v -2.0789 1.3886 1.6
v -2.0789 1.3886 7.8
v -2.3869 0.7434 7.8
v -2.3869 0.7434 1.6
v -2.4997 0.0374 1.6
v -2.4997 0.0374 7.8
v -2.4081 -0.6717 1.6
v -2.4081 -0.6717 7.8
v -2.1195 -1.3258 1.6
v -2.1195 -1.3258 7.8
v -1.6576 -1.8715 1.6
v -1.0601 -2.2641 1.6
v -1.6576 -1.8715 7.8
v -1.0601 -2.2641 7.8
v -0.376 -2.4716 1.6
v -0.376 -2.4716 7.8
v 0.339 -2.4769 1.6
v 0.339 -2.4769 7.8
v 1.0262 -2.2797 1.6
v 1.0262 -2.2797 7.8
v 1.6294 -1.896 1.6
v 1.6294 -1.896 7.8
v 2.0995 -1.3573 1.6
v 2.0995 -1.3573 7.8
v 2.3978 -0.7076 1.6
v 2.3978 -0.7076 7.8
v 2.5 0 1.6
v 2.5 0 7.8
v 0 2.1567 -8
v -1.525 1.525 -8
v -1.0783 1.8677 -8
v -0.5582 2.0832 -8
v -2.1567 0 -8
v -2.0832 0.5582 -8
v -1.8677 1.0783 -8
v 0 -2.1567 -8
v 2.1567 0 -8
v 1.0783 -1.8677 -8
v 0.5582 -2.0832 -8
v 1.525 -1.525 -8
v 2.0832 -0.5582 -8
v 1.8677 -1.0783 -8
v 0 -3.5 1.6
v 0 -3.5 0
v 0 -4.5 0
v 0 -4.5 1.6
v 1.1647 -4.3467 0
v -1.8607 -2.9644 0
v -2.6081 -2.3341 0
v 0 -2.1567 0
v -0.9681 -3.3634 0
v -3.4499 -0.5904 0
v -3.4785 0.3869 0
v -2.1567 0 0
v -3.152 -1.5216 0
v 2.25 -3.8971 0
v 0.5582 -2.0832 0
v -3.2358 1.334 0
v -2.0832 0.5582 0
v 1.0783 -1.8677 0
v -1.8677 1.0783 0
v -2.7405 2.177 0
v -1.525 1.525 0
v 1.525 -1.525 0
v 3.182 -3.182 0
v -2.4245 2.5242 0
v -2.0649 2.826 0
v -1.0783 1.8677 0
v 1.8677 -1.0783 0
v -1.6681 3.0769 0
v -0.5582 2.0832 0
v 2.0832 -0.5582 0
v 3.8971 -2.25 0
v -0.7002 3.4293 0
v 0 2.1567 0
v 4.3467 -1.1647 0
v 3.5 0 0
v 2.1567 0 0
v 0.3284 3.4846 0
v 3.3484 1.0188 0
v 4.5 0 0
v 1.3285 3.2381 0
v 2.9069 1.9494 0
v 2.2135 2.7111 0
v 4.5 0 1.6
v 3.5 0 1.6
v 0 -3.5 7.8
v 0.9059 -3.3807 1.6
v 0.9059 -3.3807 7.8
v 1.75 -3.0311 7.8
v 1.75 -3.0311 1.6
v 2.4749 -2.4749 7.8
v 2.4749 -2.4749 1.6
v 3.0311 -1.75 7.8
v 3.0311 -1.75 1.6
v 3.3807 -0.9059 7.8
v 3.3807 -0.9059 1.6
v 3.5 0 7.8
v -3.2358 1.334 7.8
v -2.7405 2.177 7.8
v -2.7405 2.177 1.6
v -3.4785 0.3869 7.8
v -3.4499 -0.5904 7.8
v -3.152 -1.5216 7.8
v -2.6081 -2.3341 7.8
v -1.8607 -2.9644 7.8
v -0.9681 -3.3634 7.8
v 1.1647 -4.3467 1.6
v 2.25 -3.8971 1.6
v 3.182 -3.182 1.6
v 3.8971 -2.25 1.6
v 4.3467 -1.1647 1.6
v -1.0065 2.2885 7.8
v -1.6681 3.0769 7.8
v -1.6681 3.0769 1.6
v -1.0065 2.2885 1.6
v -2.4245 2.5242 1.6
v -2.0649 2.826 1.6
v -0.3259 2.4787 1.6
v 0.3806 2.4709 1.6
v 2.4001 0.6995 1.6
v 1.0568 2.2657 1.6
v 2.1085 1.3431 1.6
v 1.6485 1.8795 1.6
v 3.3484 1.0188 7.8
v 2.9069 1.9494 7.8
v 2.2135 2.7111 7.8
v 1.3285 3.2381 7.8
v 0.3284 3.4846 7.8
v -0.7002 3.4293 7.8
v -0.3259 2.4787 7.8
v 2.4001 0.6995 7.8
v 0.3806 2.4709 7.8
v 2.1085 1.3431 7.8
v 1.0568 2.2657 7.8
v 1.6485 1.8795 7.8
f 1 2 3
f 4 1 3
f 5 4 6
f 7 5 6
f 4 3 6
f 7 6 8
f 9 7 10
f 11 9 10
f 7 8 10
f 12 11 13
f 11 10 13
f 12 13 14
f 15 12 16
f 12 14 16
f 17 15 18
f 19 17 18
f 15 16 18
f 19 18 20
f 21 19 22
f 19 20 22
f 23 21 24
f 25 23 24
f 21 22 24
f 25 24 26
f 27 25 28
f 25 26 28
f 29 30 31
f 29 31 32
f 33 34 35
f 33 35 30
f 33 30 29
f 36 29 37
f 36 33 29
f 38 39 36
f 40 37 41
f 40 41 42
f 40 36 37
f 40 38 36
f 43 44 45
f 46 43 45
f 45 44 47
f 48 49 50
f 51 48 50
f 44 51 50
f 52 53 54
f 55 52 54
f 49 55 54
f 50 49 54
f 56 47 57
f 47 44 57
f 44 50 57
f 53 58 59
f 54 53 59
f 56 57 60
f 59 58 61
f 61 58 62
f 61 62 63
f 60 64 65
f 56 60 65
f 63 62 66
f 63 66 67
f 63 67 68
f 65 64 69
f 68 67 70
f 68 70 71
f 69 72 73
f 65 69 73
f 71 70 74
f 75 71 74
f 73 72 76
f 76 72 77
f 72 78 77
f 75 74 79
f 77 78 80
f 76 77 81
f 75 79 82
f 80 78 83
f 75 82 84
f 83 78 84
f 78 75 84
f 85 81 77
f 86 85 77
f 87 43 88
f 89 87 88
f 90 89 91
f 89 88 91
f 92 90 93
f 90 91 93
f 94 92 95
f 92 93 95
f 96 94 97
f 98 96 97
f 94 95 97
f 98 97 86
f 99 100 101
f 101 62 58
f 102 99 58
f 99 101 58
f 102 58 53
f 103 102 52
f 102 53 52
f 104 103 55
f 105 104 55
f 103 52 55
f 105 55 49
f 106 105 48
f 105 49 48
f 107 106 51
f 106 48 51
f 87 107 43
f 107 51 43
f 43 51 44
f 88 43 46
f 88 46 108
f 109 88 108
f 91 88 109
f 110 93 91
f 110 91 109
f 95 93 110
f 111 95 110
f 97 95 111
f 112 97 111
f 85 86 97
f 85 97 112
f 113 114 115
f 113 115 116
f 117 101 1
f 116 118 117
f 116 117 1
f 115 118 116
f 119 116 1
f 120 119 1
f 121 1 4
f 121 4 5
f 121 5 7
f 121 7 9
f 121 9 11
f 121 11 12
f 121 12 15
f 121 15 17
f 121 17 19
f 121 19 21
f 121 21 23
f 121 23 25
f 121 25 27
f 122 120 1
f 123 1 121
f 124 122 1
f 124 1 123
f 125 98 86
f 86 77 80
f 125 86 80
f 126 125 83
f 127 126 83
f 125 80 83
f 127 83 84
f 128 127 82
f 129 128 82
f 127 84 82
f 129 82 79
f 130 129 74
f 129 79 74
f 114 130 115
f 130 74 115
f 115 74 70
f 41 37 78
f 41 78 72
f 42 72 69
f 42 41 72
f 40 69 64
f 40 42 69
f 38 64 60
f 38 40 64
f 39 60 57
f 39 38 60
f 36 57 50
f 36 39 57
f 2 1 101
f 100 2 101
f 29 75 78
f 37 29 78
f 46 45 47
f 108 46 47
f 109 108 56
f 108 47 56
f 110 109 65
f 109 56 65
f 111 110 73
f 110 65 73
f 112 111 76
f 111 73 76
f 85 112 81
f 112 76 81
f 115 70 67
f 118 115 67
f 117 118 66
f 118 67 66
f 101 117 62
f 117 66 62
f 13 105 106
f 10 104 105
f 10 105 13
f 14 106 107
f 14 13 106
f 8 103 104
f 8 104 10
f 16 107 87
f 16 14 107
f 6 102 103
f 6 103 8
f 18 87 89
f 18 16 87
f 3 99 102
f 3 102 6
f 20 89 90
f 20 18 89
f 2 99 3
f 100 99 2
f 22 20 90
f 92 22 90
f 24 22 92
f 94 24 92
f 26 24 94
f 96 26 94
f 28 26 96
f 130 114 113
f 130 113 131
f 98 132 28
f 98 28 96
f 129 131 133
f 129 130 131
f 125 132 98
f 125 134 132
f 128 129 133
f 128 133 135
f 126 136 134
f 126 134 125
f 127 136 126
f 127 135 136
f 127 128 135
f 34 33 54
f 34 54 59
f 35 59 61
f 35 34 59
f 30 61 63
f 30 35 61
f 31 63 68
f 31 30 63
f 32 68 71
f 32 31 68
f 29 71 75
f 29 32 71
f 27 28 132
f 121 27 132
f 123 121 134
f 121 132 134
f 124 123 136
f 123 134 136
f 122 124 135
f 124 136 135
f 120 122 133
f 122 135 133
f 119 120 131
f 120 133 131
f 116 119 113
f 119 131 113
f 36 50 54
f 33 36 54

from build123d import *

# Parameters (mm, degrees)
F1_DEPTH = 7.8
F3_DEPTH = 6.2
F4_DEPTH = 1.6
F6_DEPTH = 8
F8_DEPTH = 8.7


with BuildPart() as f1:
    # F0 (on Top) → F1 (new body)
    with BuildSketch(Plane.XY):
        with BuildLine():
            ThreePointArc((0, -3.5), (2.4748737342, -2.4748737342), (3.5, 0))
            Line((3.5, 0), (0, 0))
            Line((0, 0), (0, -3.5))
        make_face()
        with BuildLine():
            Line((0, 0), (3.5, 0))
            ThreePointArc((3.5, 0), (1.7904958486, 3.0073451109), (-1.6680712092, 3.0769365351))
            Line((-1.6680712092, 3.0769365351), (-0.7059061386, 1.9302728555))
            Line((-0.7059061386, 1.9302728555), (-1.2421372488, 1.4803215287))
            Line((-1.2421372488, 1.4803215287), (-1.778368359, 1.030370202))
            Line((-1.778368359, 1.030370202), (-2.7405334296, 2.1770338815))
            ThreePointArc((-2.7405334296, 2.1770338815), (-3.1519532504, -1.5215750745), (0, -3.5))
            Line((0, -3.5), (0, 0))
        make_face()
    extrude(amount=F1_DEPTH)

    # F2 (on face) → F3 (cut)
    with BuildSketch(Plane.XY.offset(7.8)):
        with BuildLine():
            ThreePointArc((-2.0789213734, 1.3885553367), (-0.7254986445, -2.3924154566), (2.5, 0))
            ThreePointArc((2.5, 0), (1.3663550266, 2.0935792178), (-1.0064591531, 2.2884579903))
            Line((-1.0064591531, 2.2884579903), (-0.7059061386, 1.9302728555))
            Line((-0.7059061386, 1.9302728555), (-1.778368359, 1.030370202))
            Line((-1.778368359, 1.030370202), (-2.0789213734, 1.3885553367))
        make_face()
    extrude(amount=-F3_DEPTH, mode=Mode.SUBTRACT)

    # F0 (on Top) → F4 (join)
    with BuildSketch(Plane.XY):
        with BuildLine():
            Line((-0.7059061386, 1.9302728555), (-1.6680712092, 3.0769365351))
            ThreePointArc((-1.6680712092, 3.0769365351), (-2.2497566339, 2.6811555509), (-2.7405334296, 2.1770338815))
            Line((-2.7405334296, 2.1770338815), (-1.778368359, 1.030370202))
            Line((-1.778368359, 1.030370202), (-1.2421372488, 1.4803215287))
            Line((-1.2421372488, 1.4803215287), (-0.7059061386, 1.9302728555))
        make_face()
        with BuildLine():
            Line((4.5, 0), (3.5, 0))
            ThreePointArc((3.5, 0), (2.4748737342, -2.4748737342), (0, -3.5))
            Line((0, -3.5), (0, -4.5))
            ThreePointArc((0, -4.5), (3.1819805153, -3.1819805153), (4.5, 0))
        make_face()
    extrude(amount=F4_DEPTH)

    # F5 (on face) → F6 (join)
    with BuildSketch(Plane(origin=(0, 0, 0), x_dir=(1, 0, 0), z_dir=(0, 0, -1))):
        Polygon((-2.1566756826, 0), (0, -2.1566756826), (2.1566756826, 0), (0, 2.1566756826), align=None)
    extrude(amount=F6_DEPTH)

    # F7 (on face) → F8 (join)
    with BuildSketch(Plane(origin=(0, 0, -8), x_dir=(1, 0, 0), z_dir=(0, 0, -1))):
        with BuildLine():
            Line((0, -2.1566756826), (-2.1566756826, 0))
            ThreePointArc((-2.1566756826, 0), (-1.525, -1.525), (0, -2.1566756826))
        make_face()
        with BuildLine():
            ThreePointArc((2.1566756826, 0), (1.525, 1.525), (0, 2.1566756826))
            Line((0, 2.1566756826), (2.1566756826, 0))
        make_face()
    extrude(amount=-F8_DEPTH)


solid = f1.part
